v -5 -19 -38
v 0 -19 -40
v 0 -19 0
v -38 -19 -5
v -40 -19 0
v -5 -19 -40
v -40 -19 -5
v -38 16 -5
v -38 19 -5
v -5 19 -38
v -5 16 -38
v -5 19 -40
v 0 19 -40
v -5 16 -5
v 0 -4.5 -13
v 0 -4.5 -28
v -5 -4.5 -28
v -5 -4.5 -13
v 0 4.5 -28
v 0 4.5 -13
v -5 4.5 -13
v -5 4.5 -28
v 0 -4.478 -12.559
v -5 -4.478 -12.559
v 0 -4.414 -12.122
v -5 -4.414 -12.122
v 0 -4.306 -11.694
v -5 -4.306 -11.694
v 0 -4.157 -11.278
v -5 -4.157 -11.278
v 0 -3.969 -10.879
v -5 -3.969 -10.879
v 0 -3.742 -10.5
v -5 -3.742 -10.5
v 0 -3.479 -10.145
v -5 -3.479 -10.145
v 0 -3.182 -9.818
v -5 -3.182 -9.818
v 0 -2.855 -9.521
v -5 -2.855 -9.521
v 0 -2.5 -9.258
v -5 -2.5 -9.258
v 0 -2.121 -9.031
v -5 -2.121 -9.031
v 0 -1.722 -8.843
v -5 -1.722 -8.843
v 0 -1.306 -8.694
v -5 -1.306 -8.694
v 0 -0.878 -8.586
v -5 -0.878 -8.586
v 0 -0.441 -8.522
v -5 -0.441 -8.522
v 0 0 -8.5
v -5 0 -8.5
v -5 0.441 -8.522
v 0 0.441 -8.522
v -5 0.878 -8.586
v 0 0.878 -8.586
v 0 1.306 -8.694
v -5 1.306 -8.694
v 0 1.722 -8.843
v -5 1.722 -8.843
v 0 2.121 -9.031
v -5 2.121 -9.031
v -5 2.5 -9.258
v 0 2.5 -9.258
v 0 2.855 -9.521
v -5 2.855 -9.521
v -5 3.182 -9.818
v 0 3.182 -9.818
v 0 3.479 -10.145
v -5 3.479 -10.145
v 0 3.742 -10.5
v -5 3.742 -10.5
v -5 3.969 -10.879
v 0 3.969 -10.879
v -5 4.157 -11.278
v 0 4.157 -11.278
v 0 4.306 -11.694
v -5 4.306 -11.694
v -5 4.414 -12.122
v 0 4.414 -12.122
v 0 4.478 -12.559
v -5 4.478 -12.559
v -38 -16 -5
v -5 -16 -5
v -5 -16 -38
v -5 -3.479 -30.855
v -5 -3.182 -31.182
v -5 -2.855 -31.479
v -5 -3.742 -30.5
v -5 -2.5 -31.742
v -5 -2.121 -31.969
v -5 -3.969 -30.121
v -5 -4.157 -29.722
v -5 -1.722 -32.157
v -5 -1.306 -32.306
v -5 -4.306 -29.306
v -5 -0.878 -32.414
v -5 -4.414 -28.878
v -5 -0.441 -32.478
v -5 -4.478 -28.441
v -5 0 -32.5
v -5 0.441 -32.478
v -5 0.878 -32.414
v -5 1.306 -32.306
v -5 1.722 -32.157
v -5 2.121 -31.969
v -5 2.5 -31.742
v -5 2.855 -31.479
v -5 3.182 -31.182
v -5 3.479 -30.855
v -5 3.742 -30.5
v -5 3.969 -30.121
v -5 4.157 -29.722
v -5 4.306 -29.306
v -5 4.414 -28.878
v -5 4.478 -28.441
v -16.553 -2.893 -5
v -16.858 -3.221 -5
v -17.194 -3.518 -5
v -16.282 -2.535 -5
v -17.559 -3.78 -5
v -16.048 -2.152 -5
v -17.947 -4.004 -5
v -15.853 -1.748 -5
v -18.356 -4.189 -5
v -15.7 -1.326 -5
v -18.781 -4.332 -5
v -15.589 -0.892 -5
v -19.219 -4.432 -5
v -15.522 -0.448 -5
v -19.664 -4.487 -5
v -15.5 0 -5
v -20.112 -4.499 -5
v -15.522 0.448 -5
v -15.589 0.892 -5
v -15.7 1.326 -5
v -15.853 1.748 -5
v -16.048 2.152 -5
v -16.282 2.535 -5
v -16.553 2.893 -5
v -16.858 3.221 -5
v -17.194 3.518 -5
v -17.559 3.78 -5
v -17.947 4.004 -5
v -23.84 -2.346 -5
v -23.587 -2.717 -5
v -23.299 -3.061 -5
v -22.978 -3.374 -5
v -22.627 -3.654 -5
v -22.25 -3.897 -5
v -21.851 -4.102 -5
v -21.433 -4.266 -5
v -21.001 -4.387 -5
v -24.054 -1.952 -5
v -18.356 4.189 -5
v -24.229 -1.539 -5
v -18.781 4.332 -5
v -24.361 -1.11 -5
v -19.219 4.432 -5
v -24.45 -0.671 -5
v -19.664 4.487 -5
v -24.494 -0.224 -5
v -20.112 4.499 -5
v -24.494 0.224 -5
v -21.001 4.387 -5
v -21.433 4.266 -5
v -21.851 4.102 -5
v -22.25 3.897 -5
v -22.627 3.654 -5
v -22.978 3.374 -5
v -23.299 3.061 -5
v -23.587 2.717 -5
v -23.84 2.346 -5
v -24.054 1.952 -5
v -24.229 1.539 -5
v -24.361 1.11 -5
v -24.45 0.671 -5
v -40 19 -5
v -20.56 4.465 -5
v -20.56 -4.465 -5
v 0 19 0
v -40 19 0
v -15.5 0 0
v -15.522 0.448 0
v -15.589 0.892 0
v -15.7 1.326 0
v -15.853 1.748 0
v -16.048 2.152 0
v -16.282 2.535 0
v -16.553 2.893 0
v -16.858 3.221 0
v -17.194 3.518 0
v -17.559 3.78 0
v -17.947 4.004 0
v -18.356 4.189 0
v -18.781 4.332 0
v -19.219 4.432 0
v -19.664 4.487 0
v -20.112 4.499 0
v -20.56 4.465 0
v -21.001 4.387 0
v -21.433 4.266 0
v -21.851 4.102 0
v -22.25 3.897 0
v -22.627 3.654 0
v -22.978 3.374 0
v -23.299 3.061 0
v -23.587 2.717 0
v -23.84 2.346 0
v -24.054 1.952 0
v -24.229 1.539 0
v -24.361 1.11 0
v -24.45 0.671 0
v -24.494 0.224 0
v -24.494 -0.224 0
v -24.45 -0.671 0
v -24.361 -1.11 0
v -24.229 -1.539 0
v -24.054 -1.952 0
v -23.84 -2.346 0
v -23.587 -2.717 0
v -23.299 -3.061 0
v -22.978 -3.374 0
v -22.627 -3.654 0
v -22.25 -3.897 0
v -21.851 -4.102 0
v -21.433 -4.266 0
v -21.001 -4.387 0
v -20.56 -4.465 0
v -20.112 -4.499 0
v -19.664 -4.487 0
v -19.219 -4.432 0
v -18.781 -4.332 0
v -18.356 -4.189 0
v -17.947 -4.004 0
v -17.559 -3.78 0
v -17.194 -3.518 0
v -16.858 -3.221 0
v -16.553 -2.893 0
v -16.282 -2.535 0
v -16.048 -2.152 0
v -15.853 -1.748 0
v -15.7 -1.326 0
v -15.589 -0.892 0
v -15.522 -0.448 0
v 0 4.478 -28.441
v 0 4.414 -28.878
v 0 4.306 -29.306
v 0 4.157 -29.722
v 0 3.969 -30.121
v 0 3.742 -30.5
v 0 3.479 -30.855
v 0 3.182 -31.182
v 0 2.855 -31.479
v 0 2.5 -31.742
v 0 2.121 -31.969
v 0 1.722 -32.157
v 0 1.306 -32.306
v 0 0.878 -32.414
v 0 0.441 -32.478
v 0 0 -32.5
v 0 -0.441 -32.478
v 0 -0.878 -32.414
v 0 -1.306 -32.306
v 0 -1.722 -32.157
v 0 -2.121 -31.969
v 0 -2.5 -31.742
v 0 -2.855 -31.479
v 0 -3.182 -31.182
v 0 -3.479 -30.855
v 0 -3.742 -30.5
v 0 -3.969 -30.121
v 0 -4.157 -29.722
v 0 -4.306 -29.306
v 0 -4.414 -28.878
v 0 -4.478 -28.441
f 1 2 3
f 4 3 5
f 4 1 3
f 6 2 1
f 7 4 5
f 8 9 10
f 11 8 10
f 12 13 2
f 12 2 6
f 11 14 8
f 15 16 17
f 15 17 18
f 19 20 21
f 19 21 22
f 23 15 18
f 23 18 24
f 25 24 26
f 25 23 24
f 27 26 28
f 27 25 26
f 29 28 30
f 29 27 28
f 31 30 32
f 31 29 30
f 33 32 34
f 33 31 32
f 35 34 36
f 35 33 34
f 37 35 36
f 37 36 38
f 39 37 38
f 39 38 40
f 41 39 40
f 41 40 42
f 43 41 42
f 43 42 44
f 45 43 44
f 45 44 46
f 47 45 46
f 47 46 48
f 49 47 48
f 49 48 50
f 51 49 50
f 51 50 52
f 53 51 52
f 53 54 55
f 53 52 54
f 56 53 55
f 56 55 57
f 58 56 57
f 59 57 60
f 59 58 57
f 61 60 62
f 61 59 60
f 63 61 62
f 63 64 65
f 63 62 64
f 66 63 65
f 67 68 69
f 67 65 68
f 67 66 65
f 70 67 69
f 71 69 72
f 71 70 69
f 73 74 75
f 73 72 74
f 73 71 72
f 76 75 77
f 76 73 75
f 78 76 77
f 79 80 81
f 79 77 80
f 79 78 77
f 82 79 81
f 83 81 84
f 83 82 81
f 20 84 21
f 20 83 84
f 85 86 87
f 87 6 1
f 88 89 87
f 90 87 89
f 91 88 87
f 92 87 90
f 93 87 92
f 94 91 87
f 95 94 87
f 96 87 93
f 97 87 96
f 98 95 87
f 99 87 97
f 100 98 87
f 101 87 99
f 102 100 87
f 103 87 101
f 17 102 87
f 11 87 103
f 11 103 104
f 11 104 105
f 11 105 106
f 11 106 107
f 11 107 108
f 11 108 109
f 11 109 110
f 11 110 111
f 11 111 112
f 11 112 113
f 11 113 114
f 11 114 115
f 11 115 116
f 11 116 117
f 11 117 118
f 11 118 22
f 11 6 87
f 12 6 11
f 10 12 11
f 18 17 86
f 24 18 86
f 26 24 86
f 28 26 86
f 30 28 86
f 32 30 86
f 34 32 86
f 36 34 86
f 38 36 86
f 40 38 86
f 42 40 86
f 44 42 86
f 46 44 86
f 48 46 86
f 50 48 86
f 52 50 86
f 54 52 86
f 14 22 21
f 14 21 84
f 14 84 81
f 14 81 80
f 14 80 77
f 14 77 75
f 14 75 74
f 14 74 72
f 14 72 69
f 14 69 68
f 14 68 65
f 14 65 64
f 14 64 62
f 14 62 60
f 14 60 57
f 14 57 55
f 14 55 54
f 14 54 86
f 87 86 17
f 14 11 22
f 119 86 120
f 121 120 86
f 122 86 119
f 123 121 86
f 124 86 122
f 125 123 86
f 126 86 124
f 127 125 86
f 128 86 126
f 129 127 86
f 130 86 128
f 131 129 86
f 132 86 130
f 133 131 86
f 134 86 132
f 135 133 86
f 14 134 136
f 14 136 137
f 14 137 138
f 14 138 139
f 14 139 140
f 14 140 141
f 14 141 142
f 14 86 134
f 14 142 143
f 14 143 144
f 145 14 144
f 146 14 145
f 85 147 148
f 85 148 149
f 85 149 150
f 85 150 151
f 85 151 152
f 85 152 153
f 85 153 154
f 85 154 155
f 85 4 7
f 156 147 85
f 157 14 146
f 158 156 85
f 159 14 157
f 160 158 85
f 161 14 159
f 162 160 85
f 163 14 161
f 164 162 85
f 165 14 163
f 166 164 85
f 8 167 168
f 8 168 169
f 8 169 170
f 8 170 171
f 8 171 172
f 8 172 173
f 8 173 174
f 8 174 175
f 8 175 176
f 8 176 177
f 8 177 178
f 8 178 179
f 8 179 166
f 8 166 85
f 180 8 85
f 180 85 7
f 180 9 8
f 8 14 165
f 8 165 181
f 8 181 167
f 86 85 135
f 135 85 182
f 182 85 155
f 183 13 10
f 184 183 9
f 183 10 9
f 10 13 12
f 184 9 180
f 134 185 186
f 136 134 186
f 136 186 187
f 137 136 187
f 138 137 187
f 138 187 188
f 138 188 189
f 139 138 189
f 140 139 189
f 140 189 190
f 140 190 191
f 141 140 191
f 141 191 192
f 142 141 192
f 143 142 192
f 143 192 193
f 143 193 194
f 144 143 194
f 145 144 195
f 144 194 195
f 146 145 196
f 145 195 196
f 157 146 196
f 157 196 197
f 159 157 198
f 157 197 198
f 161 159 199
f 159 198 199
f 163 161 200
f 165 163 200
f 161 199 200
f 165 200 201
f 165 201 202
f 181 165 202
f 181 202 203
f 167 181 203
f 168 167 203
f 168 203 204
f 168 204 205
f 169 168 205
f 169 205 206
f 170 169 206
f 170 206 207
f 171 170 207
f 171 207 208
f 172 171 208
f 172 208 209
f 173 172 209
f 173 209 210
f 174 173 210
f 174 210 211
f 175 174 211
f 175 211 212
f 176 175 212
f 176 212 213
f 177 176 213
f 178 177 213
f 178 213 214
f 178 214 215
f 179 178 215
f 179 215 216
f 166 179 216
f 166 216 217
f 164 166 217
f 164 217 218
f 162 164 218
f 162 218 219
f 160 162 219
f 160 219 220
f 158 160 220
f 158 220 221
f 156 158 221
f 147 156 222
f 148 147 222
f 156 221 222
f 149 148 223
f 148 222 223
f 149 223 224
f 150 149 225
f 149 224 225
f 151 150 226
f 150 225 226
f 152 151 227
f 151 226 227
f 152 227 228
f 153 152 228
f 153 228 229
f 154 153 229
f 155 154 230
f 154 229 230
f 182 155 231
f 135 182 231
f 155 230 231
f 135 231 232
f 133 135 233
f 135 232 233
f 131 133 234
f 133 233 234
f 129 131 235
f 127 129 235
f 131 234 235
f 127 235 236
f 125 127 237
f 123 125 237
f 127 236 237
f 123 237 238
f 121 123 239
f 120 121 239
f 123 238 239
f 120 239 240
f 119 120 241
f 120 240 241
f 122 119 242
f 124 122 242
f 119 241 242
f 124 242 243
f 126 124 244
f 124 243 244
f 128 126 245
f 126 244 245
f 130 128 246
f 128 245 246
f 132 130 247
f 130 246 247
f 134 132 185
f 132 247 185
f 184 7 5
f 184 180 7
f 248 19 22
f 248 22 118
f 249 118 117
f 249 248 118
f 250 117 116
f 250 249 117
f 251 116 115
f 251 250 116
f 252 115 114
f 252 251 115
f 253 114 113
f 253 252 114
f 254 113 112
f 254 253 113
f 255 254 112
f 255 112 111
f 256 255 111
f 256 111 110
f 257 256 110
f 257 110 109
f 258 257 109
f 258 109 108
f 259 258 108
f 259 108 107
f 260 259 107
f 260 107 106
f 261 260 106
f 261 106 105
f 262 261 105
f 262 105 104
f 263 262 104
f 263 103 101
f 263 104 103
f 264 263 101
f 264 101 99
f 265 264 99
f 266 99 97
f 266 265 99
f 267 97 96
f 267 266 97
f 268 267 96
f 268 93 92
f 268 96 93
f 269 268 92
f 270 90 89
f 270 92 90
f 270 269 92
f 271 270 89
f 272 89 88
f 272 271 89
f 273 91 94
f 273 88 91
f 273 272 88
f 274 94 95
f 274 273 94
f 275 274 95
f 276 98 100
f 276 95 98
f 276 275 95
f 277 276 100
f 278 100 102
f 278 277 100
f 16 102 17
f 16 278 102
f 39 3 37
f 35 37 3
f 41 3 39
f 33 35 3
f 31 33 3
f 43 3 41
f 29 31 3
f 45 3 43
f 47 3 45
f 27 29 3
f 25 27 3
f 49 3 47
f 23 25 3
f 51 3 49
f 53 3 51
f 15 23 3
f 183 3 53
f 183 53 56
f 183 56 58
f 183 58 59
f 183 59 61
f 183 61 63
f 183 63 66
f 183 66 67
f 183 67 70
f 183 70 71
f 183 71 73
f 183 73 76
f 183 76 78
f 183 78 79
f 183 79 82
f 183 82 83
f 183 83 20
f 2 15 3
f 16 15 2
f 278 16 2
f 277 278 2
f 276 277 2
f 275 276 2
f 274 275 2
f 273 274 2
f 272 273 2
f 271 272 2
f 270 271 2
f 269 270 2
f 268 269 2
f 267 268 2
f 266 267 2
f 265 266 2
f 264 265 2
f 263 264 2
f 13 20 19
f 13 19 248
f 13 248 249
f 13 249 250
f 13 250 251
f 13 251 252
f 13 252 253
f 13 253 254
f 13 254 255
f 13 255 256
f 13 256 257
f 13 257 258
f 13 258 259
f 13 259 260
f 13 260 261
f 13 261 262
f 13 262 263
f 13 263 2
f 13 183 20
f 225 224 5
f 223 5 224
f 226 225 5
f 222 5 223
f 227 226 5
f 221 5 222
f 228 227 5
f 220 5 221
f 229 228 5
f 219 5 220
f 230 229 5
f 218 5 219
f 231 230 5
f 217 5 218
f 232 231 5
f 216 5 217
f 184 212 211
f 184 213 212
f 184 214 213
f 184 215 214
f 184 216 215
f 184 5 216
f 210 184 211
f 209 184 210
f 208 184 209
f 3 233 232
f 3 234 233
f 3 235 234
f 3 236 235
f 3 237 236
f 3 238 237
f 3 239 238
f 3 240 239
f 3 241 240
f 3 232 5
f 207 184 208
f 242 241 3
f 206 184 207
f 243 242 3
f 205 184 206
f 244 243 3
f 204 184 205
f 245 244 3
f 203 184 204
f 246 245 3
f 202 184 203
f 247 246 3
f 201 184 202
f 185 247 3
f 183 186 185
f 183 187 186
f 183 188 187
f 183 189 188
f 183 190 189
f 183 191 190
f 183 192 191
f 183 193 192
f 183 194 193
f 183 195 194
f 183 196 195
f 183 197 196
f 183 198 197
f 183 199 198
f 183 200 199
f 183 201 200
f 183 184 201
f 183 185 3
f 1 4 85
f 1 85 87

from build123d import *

# Parameters (mm, degrees)
EXTRUDE_THIN1_DEPTH = 19
CUT_EXTRUDE1_DEPTH  = 60.674114991
SKETCH3_R           = 4.5
CUT_EXTRUDE2_DEPTH  = 60.674114991
BOSS_EXTRUDE1_DEPTH = 3


with BuildPart() as part:
    # Sketch1 → Extrude-Thin1 (new, symmetric)
    with BuildSketch(Plane(origin=(0, 0, 0), x_dir=(1, 0, 0), z_dir=(0, 1, 0))):
        Polygon((-40, 0), (0, 0), (0, 40), (-5, 40), (-5, 5), (-40, 5), align=None)
    extrude(amount=EXTRUDE_THIN1_DEPTH, both=True)

    # Sketch2 → Cut-Extrude1 (cut, through all)
    with BuildSketch(Plane(origin=(0, 0, 0), x_dir=(0, 0, -1), z_dir=(1, 0, 0))):
        with BuildLine():
            Line((13, 4.5), (28, 4.5))
            ThreePointArc((28, 4.5), (32.5, 0), (28, -4.5))
            Line((28, -4.5), (13, -4.5))
            ThreePointArc((13, -4.5), (8.5, 0), (13, 4.5))
        make_face()
    extrude(amount=-CUT_EXTRUDE1_DEPTH, mode=Mode.SUBTRACT)

    # Sketch3 → Cut-Extrude2 (cut, through all)
    with BuildSketch(Plane.XY):
        with Locations((-20, 0)):
            Circle(SKETCH3_R)
    extrude(amount=-CUT_EXTRUDE2_DEPTH, mode=Mode.SUBTRACT)

    # Sketch4 → Boss-Extrude1 (add)
    with BuildSketch(Plane(origin=(0, 19, 0), x_dir=(1, 0, 0), z_dir=(0, 1, 0))):
        Polygon((-38, 5), (-5, 38), (-5, 5), align=None)
    boss_extrude1 = extrude(amount=-BOSS_EXTRUDE1_DEPTH)

    # Mirror1: Boss-Extrude1 across plane
    add(boss_extrude1.mirror(Plane.ZX))


solid = part.part
